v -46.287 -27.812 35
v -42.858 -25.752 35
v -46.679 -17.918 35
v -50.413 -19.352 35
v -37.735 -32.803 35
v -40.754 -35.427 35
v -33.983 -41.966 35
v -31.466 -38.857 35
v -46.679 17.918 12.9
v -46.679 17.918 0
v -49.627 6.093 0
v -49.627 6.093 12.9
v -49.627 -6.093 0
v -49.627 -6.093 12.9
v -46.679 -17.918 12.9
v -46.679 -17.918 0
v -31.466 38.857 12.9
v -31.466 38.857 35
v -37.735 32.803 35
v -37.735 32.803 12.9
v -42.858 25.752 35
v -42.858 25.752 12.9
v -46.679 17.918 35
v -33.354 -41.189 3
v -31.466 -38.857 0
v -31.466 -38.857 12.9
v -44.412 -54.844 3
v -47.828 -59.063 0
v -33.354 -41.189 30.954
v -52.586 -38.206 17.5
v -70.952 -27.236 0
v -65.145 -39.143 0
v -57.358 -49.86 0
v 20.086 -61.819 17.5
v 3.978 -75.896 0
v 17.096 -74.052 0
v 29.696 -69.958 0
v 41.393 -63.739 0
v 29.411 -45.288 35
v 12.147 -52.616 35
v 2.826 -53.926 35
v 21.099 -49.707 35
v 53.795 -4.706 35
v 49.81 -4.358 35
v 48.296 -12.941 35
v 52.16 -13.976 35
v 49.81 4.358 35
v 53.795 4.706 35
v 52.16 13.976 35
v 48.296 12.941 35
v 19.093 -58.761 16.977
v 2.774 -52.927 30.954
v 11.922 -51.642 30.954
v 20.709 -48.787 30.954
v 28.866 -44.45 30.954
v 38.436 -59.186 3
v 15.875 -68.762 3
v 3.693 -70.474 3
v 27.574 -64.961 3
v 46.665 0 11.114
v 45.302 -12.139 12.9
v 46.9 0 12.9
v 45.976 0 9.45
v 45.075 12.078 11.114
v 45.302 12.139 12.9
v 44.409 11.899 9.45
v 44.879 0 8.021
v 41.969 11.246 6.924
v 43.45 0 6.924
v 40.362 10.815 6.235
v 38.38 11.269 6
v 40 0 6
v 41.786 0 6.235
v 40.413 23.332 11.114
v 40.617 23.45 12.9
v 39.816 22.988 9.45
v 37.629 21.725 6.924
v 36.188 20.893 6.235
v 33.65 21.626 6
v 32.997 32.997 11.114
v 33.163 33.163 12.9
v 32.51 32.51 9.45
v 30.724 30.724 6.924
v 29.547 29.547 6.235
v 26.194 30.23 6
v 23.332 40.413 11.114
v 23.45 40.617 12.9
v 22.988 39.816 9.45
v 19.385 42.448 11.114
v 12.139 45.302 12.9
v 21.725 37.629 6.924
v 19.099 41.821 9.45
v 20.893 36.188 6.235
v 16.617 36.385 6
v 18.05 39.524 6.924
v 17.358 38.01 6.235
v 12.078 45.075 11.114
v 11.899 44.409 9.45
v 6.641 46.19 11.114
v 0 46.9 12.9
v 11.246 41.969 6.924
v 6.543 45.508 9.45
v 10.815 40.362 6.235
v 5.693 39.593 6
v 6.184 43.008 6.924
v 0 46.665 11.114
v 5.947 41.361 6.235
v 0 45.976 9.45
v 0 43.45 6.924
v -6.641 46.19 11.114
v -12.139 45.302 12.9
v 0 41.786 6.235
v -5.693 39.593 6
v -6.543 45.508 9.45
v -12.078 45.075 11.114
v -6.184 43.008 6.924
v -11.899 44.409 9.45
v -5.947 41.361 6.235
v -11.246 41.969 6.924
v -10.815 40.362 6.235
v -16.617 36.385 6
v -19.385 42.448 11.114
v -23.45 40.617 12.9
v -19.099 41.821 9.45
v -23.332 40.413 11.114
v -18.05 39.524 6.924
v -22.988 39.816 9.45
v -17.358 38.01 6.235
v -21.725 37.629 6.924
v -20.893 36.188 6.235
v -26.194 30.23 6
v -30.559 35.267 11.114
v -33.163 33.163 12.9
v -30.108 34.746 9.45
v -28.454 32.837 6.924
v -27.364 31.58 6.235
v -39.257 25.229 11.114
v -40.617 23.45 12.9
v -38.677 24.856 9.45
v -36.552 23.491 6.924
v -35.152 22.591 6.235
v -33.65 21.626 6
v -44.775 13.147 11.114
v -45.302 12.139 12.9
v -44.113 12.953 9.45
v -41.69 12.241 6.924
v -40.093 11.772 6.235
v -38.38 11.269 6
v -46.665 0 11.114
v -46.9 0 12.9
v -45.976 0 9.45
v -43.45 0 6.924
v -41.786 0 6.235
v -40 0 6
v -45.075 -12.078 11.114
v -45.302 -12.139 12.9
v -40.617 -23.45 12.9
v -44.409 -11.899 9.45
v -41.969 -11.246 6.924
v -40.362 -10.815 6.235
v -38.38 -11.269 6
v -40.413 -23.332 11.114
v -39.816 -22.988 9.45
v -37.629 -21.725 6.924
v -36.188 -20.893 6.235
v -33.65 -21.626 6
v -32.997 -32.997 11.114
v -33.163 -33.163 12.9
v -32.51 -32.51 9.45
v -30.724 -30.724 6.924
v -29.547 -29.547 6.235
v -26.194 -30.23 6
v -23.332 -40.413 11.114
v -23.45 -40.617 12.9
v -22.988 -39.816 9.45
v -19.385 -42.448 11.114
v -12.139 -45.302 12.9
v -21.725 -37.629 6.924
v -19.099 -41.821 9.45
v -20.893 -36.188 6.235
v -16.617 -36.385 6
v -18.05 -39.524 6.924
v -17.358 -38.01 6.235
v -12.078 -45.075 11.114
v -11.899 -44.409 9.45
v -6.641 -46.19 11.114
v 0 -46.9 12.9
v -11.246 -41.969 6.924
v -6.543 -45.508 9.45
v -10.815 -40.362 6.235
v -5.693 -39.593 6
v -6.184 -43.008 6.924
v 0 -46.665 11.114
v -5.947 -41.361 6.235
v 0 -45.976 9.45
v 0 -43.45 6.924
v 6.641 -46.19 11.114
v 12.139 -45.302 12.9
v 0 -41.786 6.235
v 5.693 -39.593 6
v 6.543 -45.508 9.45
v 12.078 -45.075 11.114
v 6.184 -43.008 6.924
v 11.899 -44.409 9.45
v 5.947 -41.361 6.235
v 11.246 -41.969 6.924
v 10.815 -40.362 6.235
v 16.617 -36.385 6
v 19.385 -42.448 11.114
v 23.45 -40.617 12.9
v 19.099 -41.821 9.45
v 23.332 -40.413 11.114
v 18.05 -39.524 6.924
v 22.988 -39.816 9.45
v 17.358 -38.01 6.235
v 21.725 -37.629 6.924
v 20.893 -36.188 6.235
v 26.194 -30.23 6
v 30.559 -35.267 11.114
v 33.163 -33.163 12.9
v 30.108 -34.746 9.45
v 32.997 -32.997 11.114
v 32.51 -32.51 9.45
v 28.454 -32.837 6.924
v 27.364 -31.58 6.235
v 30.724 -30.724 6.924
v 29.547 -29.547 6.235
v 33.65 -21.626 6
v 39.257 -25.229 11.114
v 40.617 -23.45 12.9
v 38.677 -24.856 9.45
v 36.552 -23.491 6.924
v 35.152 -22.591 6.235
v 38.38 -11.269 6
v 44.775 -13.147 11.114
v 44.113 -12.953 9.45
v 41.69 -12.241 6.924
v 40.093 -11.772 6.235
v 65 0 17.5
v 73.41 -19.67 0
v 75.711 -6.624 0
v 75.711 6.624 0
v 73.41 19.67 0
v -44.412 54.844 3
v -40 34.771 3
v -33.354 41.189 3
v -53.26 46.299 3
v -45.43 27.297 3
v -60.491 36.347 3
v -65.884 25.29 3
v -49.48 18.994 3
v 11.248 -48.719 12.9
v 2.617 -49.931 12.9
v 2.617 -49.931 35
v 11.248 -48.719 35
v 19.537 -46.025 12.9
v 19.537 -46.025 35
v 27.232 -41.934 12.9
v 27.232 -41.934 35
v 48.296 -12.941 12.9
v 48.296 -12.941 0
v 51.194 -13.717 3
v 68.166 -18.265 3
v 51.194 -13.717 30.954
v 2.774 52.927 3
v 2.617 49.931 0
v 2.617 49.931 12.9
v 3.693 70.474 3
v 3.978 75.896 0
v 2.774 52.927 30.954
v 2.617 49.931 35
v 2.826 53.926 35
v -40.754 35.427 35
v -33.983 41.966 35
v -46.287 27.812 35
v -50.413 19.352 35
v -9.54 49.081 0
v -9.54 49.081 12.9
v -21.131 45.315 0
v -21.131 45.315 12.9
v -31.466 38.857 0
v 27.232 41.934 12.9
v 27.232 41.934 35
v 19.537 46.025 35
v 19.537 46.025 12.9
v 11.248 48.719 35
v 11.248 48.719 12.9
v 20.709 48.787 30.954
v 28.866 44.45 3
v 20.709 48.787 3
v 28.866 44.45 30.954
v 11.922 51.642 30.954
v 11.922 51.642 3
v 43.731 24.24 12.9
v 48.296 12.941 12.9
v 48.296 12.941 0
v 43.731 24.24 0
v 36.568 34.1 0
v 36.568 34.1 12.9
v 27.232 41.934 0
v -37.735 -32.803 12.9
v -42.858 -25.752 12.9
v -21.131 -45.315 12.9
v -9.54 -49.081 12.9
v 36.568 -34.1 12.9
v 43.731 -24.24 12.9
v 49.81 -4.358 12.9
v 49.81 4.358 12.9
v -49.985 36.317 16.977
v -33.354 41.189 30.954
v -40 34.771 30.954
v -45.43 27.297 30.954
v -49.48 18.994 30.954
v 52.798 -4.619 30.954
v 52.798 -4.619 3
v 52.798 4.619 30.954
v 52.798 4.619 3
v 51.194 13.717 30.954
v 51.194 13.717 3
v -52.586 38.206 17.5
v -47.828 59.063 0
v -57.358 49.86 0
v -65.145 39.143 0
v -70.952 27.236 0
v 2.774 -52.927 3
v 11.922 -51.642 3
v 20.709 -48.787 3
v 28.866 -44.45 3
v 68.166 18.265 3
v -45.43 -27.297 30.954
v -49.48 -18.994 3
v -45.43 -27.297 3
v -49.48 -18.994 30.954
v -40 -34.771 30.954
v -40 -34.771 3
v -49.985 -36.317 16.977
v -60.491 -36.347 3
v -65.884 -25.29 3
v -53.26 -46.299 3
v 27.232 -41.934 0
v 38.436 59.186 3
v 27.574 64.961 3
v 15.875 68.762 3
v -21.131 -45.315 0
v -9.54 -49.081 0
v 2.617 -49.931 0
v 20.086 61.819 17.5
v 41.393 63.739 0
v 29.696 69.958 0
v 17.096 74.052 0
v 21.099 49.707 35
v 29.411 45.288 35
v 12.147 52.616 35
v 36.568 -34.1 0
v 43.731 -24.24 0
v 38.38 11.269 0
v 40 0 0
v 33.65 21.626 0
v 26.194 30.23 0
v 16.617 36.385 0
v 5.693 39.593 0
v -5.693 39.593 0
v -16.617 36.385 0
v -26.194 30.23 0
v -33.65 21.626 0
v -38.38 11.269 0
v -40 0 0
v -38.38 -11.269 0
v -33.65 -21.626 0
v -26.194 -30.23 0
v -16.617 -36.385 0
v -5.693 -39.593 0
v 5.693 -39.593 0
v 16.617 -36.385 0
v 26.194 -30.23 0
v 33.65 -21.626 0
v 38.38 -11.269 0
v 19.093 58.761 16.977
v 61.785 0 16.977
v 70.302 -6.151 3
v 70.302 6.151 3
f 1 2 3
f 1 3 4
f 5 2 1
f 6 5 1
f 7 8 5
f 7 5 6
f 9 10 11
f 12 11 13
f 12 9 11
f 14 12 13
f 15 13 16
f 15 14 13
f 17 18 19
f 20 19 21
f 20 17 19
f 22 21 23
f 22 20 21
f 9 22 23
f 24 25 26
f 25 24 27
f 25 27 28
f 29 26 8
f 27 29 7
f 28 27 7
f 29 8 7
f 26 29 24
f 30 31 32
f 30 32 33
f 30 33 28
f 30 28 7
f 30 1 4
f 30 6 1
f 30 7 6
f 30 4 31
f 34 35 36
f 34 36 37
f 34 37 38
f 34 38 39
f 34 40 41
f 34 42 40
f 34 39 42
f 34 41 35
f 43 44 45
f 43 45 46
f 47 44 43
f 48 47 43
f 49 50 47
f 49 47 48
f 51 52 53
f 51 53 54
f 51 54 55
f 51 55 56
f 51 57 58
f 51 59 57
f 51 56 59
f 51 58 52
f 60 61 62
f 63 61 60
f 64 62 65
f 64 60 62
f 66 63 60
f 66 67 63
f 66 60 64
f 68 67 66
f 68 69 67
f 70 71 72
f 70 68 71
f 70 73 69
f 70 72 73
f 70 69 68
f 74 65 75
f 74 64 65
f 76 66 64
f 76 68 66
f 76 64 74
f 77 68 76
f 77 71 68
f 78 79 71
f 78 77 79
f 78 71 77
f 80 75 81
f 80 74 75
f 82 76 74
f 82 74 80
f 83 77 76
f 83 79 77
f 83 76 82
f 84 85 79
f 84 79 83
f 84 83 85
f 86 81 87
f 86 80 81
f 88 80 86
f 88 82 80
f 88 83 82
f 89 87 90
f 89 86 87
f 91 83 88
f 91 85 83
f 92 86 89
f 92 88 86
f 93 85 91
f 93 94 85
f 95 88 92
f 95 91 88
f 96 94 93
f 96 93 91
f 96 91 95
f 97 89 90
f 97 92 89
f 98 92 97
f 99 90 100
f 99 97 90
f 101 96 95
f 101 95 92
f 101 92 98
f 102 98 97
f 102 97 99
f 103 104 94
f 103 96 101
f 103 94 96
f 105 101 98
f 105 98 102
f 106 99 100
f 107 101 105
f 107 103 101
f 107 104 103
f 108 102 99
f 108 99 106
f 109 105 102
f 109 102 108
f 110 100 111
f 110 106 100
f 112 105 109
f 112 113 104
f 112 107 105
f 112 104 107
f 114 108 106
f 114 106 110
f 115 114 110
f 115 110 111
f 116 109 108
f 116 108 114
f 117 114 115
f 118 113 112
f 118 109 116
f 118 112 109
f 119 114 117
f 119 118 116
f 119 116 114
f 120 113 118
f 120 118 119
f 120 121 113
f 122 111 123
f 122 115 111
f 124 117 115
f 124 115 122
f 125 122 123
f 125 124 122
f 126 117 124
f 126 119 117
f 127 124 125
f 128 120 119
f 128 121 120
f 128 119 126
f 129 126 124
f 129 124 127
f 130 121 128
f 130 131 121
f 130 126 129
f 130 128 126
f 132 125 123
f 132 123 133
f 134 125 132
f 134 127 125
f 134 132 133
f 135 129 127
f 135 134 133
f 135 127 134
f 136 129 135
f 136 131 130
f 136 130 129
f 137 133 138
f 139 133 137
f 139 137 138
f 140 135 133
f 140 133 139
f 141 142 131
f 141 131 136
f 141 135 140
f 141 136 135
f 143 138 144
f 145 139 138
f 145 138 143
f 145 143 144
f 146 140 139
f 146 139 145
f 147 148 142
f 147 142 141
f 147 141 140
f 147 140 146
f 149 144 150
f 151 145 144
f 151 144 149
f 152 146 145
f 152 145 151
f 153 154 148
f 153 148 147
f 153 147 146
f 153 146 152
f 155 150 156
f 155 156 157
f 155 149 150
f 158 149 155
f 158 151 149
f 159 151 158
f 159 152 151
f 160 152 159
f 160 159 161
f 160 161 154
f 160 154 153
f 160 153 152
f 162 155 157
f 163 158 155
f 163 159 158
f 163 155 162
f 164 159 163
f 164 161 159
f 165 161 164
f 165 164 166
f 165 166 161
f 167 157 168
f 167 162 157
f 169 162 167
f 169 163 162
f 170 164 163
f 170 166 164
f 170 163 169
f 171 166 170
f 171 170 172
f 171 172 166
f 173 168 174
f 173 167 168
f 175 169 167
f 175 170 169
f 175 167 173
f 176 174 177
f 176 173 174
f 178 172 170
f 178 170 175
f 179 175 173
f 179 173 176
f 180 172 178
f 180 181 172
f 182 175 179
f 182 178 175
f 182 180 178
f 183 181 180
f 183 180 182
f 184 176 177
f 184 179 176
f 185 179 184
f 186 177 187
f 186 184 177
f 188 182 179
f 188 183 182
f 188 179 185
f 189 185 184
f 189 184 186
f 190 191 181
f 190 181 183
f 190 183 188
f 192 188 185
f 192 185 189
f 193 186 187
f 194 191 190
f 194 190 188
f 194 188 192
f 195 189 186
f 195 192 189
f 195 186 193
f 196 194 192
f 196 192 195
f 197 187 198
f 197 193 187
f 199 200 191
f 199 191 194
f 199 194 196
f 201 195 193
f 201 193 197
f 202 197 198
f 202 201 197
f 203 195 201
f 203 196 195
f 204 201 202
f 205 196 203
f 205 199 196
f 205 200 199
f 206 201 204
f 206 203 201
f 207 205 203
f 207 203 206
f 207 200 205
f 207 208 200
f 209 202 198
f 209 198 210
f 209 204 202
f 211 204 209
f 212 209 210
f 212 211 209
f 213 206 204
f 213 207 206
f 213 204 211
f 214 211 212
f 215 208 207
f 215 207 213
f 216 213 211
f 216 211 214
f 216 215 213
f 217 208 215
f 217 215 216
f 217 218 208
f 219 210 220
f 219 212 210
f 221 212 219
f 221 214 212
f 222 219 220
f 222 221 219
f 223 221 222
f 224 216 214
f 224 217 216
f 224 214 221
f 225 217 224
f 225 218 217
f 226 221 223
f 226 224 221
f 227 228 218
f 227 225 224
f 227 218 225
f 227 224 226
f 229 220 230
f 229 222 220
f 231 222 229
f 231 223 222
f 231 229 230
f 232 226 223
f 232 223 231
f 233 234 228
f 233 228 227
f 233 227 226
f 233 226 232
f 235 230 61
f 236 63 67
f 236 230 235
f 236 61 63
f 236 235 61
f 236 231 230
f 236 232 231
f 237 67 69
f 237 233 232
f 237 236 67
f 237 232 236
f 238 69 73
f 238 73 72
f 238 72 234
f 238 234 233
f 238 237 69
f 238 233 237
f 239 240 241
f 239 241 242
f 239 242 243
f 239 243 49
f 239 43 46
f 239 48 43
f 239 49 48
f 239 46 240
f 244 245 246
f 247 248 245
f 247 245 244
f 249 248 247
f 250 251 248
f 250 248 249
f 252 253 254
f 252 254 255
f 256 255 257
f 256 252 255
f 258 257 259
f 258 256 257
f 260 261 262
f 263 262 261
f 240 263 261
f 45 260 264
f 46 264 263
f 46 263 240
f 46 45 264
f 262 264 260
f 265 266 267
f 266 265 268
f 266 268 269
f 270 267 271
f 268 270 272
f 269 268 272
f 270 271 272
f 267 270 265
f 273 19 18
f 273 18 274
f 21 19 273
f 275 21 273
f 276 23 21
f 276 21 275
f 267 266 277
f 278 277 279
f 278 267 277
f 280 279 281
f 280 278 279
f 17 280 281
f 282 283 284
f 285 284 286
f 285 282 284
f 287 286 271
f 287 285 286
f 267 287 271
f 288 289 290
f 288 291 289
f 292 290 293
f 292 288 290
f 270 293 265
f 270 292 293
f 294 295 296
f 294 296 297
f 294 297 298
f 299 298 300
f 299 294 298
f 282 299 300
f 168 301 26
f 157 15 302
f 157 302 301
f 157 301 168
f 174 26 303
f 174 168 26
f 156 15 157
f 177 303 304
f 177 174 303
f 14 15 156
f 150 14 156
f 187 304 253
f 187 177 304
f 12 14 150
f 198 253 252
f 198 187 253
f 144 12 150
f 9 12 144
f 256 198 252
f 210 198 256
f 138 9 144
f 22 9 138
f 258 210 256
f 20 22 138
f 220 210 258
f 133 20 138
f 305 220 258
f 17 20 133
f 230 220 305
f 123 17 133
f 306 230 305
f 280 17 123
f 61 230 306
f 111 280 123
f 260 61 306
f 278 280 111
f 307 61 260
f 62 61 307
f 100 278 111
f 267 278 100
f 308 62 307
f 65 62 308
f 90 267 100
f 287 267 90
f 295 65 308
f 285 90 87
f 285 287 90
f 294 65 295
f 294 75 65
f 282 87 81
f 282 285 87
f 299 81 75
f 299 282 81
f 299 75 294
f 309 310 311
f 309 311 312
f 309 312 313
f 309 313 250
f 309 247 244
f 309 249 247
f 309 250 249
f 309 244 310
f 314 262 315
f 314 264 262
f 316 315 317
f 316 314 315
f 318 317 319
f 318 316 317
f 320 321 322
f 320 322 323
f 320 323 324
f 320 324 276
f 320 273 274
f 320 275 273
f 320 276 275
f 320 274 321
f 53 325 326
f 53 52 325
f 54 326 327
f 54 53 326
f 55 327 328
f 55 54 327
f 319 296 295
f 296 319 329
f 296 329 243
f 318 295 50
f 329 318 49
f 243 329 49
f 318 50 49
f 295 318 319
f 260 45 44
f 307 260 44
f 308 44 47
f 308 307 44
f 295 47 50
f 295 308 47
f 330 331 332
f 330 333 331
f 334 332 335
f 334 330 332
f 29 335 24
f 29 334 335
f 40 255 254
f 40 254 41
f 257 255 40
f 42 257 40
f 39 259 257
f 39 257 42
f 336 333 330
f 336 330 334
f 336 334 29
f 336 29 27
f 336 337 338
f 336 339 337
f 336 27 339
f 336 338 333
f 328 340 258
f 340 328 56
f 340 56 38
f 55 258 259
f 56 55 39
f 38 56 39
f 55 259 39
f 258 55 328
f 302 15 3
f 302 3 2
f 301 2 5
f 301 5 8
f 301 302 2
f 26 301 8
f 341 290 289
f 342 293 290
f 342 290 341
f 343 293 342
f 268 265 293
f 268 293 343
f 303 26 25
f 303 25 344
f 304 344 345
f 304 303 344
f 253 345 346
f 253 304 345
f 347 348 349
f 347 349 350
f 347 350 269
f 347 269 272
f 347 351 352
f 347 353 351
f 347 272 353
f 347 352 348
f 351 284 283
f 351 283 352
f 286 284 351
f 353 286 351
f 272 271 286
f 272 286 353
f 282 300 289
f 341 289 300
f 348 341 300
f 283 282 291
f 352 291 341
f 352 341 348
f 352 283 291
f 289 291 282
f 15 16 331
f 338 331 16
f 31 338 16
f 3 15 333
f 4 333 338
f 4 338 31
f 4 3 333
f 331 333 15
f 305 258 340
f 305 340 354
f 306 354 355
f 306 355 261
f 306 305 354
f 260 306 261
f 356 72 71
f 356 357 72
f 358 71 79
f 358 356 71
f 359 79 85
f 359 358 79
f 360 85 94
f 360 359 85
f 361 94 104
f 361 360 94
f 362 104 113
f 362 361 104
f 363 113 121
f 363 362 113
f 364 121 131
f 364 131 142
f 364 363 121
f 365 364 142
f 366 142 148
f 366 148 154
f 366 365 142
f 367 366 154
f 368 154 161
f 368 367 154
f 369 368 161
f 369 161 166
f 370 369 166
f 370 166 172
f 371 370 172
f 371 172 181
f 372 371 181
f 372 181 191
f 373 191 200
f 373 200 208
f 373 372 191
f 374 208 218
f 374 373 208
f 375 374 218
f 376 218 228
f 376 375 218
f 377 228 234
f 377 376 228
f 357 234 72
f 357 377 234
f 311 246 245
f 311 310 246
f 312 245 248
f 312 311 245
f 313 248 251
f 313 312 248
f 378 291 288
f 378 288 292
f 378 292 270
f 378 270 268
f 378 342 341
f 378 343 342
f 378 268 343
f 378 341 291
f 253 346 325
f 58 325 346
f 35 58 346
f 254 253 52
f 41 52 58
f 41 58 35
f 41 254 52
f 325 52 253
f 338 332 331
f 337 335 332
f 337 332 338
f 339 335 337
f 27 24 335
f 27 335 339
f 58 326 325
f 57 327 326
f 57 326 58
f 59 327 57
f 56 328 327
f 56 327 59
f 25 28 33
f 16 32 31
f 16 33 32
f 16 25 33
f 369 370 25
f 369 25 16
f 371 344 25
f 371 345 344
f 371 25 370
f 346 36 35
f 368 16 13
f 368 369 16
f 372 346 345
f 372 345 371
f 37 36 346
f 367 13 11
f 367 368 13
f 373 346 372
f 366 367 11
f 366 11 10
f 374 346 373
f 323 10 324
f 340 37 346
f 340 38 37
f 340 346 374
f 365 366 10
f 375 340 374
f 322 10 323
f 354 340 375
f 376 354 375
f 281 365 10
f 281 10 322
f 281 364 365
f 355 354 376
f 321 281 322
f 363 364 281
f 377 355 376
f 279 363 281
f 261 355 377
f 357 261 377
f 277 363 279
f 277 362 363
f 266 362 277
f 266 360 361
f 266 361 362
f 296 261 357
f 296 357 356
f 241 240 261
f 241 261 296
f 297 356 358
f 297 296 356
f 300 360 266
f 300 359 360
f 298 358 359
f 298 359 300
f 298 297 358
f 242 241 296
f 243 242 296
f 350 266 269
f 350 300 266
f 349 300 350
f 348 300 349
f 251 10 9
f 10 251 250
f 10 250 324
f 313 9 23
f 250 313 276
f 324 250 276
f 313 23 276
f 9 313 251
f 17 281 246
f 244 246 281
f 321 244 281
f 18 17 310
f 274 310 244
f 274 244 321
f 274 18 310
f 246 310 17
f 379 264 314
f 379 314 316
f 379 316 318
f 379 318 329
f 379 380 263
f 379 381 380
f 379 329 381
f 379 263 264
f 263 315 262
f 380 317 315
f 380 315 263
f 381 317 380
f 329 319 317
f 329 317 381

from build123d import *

# Parameters (mm, degrees)
F4_ANGLE_BACK   = 15
F4_ANGLE        = 30
F4_COPIES_COUNT = 5


# Not quite as in the source:
# - a pattern or mirror of a feature is missing from the dataset's text; its kind, count and spacing are read off the source's solid


with BuildPart() as f2:
    # F1 (on Front) → F2 (revolve)
    with BuildSketch(Plane.XZ):
        with BuildLine():
            Line((40, 6), (40, 0))
            Line((40, 0), (50, 0))
            Line((50, 0), (50, 12.9))
            Line((50, 12.9), (46.9, 12.9))
            ThreePointArc((46.9, 12.9), (44.8790367902, 8.0209632098), (40, 6))
        make_face()
    revolve(axis=Axis((0, 0, 7.8032705933), (0, 0, 1)))

    # F3 (on Front) → F4 (revolve)
    with BuildSketch(Plane.XZ, mode=Mode.PRIVATE) as f4_sk:
        Polygon((50, 35), (50, 0), (76, 0), (54, 35), align=None)
        Polygon((53, 30.9536291067), (70.5708525814, 3), (53, 3), align=None, mode=Mode.SUBTRACT)
    f4 = revolve(f4_sk.sketch.rotate(Axis((0, 0, 7.8032705933), (0, 0, 1)), -F4_ANGLE_BACK), axis=Axis((0, 0, 7.8032705933), (0, 0, 1)), revolution_arc=F4_ANGLE)

    # F4_copies: F4 ×5 about axis
    f4_copies_axis = Axis((0, 0, 0), (0, 0, 1))
    for i in range(1, F4_COPIES_COUNT):
        add(f4.rotate(f4_copies_axis, i * 360 / F4_COPIES_COUNT))


solid = f2.part
